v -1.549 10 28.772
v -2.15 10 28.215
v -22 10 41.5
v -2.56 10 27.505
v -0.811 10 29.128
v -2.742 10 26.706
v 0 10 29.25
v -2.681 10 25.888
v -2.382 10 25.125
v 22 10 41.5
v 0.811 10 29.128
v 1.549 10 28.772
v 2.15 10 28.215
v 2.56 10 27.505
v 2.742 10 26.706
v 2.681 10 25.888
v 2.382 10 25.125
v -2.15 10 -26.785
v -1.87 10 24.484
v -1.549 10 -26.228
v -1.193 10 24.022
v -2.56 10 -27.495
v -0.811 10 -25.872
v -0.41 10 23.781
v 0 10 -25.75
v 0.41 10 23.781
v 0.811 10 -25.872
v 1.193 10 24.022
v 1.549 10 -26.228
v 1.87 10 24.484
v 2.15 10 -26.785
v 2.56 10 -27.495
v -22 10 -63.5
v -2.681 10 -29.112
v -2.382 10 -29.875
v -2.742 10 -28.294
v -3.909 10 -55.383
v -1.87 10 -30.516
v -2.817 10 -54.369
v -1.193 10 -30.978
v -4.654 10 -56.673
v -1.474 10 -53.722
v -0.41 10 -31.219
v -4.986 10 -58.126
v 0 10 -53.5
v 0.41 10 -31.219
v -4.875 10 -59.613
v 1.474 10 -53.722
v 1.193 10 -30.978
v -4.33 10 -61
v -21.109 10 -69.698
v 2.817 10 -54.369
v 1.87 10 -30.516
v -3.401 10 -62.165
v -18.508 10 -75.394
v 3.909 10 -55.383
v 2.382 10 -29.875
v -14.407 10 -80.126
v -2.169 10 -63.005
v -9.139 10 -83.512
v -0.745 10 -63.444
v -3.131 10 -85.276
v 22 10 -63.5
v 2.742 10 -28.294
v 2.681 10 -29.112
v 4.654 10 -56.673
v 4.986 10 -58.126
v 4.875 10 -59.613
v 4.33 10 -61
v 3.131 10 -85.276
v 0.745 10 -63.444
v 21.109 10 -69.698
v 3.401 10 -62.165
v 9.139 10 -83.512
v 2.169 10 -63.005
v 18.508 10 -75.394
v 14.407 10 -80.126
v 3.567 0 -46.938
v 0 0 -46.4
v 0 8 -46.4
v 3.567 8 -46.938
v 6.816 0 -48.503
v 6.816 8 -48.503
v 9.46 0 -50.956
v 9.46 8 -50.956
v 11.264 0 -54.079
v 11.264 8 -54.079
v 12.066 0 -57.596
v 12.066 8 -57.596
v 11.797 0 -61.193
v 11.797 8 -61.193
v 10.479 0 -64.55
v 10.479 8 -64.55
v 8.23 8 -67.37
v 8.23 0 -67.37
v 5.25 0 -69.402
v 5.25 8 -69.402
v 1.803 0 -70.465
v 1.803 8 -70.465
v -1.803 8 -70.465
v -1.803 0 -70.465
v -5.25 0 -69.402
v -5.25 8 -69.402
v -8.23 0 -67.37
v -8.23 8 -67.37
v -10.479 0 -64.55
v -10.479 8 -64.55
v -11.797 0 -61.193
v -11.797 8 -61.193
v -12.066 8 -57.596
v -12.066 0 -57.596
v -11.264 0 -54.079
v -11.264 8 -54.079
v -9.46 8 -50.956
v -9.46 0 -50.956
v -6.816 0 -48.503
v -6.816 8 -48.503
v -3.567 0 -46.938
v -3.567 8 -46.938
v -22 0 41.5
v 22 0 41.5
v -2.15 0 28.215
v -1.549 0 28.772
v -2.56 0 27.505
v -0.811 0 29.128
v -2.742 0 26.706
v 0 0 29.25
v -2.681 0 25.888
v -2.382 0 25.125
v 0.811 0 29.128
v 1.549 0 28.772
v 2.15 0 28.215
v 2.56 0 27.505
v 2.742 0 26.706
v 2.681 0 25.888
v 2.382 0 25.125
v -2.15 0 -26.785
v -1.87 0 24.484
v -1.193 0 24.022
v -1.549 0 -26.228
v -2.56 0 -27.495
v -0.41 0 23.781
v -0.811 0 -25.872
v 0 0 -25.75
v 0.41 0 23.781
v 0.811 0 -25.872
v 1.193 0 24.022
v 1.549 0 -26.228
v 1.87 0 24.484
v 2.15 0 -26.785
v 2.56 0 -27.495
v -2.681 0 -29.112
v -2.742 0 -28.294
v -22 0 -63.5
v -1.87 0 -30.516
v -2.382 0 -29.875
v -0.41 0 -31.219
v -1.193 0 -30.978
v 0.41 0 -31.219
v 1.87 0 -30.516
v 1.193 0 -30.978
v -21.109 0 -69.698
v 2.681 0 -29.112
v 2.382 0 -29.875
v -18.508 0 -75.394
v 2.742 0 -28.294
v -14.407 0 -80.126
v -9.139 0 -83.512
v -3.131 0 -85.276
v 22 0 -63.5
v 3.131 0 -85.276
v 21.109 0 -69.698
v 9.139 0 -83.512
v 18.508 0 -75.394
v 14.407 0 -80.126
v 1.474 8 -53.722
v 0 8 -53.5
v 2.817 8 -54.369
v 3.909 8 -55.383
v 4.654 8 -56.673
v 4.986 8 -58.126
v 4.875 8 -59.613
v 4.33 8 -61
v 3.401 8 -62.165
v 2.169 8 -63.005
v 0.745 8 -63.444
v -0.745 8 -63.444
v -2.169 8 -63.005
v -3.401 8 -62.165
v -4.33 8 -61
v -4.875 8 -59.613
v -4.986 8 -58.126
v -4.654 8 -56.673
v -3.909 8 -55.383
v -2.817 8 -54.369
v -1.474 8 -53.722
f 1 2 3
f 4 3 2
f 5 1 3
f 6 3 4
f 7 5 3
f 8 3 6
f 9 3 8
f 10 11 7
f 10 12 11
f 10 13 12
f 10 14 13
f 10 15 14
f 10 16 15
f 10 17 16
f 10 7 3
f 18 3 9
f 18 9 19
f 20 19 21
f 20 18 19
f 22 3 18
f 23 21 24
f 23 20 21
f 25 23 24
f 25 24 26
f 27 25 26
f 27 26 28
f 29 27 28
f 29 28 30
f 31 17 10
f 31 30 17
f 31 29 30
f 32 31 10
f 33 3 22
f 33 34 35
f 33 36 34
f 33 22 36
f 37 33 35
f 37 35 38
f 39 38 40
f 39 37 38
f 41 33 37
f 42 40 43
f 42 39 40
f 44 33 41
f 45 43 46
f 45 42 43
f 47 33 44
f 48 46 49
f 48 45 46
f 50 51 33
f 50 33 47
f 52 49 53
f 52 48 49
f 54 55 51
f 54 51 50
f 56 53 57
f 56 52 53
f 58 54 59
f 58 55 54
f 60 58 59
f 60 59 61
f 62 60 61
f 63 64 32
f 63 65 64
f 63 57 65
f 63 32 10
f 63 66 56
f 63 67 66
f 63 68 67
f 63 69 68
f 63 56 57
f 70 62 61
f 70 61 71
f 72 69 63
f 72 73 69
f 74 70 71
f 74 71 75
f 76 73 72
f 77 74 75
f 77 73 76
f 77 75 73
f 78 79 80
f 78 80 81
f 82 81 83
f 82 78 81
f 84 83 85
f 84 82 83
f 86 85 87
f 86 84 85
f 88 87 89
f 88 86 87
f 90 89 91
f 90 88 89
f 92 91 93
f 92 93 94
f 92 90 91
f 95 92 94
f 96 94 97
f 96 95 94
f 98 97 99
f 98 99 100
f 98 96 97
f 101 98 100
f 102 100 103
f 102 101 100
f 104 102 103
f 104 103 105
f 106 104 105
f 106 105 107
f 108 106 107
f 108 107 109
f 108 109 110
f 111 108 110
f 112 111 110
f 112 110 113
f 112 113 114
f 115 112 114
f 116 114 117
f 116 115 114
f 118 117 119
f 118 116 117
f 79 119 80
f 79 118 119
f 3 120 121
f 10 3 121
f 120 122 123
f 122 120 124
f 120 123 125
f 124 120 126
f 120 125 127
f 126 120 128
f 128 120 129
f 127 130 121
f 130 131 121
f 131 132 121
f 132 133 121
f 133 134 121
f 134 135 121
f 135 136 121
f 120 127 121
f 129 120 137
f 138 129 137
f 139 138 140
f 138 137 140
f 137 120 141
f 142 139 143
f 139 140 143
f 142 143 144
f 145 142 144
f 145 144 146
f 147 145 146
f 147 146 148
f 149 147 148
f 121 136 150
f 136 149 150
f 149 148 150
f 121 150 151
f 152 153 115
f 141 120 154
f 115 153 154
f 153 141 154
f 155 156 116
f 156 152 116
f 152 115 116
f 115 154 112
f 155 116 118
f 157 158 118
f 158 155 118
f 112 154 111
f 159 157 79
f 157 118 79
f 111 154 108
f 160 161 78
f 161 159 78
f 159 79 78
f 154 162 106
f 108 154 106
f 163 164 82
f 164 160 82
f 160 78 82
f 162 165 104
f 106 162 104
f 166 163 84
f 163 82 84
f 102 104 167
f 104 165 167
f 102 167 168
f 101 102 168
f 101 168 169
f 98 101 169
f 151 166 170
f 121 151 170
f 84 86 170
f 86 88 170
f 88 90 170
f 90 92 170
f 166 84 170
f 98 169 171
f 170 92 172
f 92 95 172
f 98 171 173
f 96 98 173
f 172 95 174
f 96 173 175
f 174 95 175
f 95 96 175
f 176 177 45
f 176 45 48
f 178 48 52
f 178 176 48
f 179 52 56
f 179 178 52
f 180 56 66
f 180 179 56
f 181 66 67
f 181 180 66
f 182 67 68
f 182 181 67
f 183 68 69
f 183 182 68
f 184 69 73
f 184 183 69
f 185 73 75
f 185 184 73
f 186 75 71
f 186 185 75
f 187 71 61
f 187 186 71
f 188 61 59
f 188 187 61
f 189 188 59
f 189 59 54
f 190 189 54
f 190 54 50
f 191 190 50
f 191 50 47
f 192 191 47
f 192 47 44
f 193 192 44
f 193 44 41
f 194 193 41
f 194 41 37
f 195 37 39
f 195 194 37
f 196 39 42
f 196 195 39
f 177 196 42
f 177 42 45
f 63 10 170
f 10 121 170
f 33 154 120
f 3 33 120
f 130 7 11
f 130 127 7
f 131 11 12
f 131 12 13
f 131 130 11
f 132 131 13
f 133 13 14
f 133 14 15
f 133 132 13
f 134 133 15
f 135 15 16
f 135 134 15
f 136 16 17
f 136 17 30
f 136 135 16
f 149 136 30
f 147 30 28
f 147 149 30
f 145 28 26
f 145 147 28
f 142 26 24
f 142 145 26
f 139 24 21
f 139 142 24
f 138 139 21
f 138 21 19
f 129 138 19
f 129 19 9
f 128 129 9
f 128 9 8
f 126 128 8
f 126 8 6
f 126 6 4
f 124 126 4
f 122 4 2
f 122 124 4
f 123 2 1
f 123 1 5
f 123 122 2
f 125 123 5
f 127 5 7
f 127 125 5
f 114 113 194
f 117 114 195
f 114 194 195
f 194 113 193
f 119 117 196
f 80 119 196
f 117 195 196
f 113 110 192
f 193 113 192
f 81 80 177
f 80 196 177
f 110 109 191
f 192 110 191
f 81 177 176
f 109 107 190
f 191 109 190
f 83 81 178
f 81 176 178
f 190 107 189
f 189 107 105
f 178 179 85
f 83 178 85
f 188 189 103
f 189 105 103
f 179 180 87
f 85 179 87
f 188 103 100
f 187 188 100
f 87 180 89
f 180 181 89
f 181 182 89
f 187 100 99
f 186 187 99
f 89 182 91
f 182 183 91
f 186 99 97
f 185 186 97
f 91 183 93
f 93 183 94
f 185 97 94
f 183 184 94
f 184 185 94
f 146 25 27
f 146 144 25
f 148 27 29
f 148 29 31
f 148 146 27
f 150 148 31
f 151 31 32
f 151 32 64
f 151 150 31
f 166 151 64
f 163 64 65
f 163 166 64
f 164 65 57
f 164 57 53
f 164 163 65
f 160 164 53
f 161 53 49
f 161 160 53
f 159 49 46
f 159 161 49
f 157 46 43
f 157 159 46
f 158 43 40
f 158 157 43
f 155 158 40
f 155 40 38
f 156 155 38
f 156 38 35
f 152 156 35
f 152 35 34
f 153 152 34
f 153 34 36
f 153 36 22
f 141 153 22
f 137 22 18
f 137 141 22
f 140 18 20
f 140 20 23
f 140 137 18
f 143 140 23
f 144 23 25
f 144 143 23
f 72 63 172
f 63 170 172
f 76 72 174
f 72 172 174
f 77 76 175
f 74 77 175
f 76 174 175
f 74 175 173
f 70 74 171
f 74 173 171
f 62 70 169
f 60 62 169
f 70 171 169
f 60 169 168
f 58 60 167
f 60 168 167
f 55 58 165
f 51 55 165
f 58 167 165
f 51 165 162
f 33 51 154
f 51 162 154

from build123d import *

# Parameters (mm, degrees)
SKETCH1_R           = 2.75
SKETCH1_R_2         = 12.1
BOSS_EXTRUDE1_DEPTH = 8
SKETCH2_R           = 2.75
SKETCH2_R_2         = 5
BOSS_EXTRUDE2_DEPTH = 2


with BuildPart() as part:
    # Sketch1 → Boss-Extrude1 (new body)
    with BuildSketch(Plane(origin=(0, 0, 0), x_dir=(1, 0, 0), z_dir=(0, 1, 0))):
        with BuildLine():
            Line((-22, 63.5), (-22, 41.5))
            Line((-22, 41.5), (-22, -41.5))
            Line((-22, -41.5), (22, -41.5))
            Line((22, -41.5), (22, 41.5))
            Line((22, 41.5), (22, 63.5))
            ThreePointArc((22, 63.5), (0, 85.5), (-22, 63.5))
        make_face()
        with Locations(Location((0, -26.5, 0), (0, 0, 270))):
            Circle(SKETCH1_R, mode=Mode.SUBTRACT)
        with Locations(Location((0, 58.5, 0), (0, 0, 270))):
            Circle(SKETCH1_R_2, mode=Mode.SUBTRACT)
        with Locations(Location((0, 28.5, 0), (0, 0, 270))):
            Circle(SKETCH1_R, mode=Mode.SUBTRACT)
    extrude(amount=BOSS_EXTRUDE1_DEPTH)

    # Sketch2 → Boss-Extrude2 (add)
    with BuildSketch(Plane(origin=(0, 8, 0), x_dir=(1, 0, 0), z_dir=(0, 1, 0))):
        with BuildLine():
            Line((-22, -41.5), (22, -41.5))
            Line((22, -41.5), (22, 63.5))
            ThreePointArc((22, 63.5), (0, 85.5), (-22, 63.5))
            Line((-22, 63.5), (-22, -41.5))
        make_face()
        with Locations(Location((0, 28.5, 0), (0, 0, 270))):
            Circle(SKETCH2_R, mode=Mode.SUBTRACT)
        with Locations(Location((0, -26.5, 0), (0, 0, 270))):
            Circle(SKETCH2_R, mode=Mode.SUBTRACT)
        with Locations(Location((0, 58.5, 0), (0, 0, 270))):
            Circle(SKETCH2_R_2, mode=Mode.SUBTRACT)
    extrude(amount=BOSS_EXTRUDE2_DEPTH)


solid = part.part
